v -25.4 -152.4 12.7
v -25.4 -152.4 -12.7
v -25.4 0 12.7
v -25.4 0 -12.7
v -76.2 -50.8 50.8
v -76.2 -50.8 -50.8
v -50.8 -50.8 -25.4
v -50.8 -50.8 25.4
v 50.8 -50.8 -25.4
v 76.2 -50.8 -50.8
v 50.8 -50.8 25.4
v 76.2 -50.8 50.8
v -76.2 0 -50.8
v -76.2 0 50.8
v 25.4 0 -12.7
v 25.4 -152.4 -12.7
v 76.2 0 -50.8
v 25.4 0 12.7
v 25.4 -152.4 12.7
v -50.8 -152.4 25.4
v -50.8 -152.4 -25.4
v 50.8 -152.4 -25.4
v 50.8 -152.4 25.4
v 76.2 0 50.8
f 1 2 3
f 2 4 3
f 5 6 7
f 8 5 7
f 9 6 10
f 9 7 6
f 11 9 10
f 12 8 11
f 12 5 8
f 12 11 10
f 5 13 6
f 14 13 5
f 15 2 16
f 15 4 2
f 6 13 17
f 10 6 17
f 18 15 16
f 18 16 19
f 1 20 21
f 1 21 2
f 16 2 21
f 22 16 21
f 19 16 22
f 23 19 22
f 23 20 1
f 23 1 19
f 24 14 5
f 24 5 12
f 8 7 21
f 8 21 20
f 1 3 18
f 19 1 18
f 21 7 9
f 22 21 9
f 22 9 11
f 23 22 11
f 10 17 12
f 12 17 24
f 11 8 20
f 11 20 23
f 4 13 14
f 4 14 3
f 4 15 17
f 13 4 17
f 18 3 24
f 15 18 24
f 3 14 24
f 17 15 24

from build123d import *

# Parameters (mm, degrees)
F0_W     = 152.4
F0_H     = 101.6
F1_DEPTH = 50.8
F2_W     = 50.8
F2_H     = 25.4
F3_DEPTH = 50.801
F4_W     = 101.6
F4_H     = 50.8
F4_W_2   = 50.8
F4_H_2   = 25.4
F5_DEPTH = 101.6


with BuildPart() as f1:
    # F0 (on Front) → F1 (new body)
    with BuildSketch(Plane.XZ):
        Rectangle(F0_W, F0_H)
    extrude(amount=F1_DEPTH)

    # F2 (on face) → F3 (cut, through all)
    with BuildSketch(Plane.XZ.offset(50.8)):
        Rectangle(F2_W, F2_H)
    extrude(amount=-F3_DEPTH, mode=Mode.SUBTRACT)

    # F4 (on face) → F5 (join)
    with BuildSketch(Plane.XZ.offset(50.8)):
        Rectangle(F4_W, F4_H)
        Rectangle(F4_W_2, F4_H_2, mode=Mode.SUBTRACT)
    extrude(amount=F5_DEPTH)


solid = f1.part
